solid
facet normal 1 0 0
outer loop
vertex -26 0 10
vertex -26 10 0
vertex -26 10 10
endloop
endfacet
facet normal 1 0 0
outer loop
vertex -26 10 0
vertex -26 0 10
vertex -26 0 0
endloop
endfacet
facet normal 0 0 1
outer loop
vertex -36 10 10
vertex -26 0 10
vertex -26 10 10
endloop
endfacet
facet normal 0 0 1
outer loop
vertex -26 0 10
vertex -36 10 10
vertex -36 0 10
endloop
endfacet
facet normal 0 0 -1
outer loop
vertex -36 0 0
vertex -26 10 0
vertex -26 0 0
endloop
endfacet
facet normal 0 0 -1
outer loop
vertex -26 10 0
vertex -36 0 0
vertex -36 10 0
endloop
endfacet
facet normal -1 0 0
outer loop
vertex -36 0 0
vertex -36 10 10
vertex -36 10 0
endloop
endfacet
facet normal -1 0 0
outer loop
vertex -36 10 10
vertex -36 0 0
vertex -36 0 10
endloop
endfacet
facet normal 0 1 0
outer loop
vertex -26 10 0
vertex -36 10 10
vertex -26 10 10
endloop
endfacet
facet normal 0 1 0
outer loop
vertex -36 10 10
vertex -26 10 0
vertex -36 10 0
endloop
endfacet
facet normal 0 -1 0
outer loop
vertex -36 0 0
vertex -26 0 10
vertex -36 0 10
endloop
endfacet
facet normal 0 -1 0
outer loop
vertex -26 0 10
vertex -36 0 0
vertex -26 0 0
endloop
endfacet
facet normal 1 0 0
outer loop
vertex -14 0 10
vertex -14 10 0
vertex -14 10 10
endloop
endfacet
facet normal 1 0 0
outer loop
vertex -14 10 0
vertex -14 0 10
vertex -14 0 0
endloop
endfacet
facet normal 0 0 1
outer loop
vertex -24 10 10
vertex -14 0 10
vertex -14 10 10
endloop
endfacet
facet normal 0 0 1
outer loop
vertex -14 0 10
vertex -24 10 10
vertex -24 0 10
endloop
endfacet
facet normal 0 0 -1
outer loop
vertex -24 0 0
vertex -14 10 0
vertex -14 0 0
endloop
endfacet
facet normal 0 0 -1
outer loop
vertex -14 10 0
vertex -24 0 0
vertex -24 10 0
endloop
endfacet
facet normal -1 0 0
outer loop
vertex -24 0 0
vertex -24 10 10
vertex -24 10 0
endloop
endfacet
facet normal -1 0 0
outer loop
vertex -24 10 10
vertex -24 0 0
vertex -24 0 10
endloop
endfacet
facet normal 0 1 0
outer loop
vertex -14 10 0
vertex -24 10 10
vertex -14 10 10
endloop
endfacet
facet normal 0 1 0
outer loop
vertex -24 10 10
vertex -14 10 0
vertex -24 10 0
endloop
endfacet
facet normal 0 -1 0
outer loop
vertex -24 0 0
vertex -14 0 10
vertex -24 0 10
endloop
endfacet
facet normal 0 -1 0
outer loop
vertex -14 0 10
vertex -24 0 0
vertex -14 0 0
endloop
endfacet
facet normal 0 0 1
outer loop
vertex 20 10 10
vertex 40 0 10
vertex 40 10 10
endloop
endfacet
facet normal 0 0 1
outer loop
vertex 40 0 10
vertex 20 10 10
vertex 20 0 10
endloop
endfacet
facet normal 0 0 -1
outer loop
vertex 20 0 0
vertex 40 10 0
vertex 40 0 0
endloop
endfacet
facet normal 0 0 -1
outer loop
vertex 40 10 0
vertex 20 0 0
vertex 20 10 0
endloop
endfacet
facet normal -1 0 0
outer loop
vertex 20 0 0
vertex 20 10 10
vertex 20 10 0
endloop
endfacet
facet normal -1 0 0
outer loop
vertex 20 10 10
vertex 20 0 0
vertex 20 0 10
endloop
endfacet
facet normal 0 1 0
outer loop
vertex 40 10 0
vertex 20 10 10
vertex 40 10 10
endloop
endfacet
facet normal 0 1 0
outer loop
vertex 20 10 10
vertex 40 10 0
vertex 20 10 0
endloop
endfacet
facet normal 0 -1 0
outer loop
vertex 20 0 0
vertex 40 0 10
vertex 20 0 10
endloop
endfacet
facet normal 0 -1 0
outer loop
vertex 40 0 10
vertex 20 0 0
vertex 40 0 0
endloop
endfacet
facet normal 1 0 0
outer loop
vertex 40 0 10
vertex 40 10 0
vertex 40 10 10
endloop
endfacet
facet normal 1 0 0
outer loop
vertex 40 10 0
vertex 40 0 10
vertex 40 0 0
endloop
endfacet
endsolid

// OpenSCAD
// Fusecheck-gate fixture (scripts/fusecheck-check.sh --selftest, issue #627):
// a tiny two-pose design the fixture manifests gate. Each pose is one way a
// body count can land, and the manifests pin the verdict each must produce:
//   separable   two cubes with a 2 mm gap — two separable bodies (the count
//               every passing assert row expects)
//   fused       two cubes sharing a full face — one connected body over the
//               face-adjacency graph (the count the WARN row cannot meet and
//               the mandatory control must stay at)
//   assembled   both poses side by side, the ungated default render
// Units: mm. Plain cubes on purpose — the selftest renders it, nobody prints
// it, and the body count must stay 2 / 1 at any curve quality.
part = "assembled";     // which pose to render (see the header)

module separable() {
    translate([-6, 0, 0]) cube([10, 10, 10]);
    translate([+6, 0, 0]) cube([10, 10, 10]);
}

module fused() {
    translate([-10, 0, 0]) cube([10, 10, 10]);
    cube([10, 10, 10]);
}

module assembled() {
    translate([-30, 0, 0]) separable();
    translate([+30, 0, 0]) fused();
}

if (part == "separable") separable();
else if (part == "fused") fused();
else assembled();
